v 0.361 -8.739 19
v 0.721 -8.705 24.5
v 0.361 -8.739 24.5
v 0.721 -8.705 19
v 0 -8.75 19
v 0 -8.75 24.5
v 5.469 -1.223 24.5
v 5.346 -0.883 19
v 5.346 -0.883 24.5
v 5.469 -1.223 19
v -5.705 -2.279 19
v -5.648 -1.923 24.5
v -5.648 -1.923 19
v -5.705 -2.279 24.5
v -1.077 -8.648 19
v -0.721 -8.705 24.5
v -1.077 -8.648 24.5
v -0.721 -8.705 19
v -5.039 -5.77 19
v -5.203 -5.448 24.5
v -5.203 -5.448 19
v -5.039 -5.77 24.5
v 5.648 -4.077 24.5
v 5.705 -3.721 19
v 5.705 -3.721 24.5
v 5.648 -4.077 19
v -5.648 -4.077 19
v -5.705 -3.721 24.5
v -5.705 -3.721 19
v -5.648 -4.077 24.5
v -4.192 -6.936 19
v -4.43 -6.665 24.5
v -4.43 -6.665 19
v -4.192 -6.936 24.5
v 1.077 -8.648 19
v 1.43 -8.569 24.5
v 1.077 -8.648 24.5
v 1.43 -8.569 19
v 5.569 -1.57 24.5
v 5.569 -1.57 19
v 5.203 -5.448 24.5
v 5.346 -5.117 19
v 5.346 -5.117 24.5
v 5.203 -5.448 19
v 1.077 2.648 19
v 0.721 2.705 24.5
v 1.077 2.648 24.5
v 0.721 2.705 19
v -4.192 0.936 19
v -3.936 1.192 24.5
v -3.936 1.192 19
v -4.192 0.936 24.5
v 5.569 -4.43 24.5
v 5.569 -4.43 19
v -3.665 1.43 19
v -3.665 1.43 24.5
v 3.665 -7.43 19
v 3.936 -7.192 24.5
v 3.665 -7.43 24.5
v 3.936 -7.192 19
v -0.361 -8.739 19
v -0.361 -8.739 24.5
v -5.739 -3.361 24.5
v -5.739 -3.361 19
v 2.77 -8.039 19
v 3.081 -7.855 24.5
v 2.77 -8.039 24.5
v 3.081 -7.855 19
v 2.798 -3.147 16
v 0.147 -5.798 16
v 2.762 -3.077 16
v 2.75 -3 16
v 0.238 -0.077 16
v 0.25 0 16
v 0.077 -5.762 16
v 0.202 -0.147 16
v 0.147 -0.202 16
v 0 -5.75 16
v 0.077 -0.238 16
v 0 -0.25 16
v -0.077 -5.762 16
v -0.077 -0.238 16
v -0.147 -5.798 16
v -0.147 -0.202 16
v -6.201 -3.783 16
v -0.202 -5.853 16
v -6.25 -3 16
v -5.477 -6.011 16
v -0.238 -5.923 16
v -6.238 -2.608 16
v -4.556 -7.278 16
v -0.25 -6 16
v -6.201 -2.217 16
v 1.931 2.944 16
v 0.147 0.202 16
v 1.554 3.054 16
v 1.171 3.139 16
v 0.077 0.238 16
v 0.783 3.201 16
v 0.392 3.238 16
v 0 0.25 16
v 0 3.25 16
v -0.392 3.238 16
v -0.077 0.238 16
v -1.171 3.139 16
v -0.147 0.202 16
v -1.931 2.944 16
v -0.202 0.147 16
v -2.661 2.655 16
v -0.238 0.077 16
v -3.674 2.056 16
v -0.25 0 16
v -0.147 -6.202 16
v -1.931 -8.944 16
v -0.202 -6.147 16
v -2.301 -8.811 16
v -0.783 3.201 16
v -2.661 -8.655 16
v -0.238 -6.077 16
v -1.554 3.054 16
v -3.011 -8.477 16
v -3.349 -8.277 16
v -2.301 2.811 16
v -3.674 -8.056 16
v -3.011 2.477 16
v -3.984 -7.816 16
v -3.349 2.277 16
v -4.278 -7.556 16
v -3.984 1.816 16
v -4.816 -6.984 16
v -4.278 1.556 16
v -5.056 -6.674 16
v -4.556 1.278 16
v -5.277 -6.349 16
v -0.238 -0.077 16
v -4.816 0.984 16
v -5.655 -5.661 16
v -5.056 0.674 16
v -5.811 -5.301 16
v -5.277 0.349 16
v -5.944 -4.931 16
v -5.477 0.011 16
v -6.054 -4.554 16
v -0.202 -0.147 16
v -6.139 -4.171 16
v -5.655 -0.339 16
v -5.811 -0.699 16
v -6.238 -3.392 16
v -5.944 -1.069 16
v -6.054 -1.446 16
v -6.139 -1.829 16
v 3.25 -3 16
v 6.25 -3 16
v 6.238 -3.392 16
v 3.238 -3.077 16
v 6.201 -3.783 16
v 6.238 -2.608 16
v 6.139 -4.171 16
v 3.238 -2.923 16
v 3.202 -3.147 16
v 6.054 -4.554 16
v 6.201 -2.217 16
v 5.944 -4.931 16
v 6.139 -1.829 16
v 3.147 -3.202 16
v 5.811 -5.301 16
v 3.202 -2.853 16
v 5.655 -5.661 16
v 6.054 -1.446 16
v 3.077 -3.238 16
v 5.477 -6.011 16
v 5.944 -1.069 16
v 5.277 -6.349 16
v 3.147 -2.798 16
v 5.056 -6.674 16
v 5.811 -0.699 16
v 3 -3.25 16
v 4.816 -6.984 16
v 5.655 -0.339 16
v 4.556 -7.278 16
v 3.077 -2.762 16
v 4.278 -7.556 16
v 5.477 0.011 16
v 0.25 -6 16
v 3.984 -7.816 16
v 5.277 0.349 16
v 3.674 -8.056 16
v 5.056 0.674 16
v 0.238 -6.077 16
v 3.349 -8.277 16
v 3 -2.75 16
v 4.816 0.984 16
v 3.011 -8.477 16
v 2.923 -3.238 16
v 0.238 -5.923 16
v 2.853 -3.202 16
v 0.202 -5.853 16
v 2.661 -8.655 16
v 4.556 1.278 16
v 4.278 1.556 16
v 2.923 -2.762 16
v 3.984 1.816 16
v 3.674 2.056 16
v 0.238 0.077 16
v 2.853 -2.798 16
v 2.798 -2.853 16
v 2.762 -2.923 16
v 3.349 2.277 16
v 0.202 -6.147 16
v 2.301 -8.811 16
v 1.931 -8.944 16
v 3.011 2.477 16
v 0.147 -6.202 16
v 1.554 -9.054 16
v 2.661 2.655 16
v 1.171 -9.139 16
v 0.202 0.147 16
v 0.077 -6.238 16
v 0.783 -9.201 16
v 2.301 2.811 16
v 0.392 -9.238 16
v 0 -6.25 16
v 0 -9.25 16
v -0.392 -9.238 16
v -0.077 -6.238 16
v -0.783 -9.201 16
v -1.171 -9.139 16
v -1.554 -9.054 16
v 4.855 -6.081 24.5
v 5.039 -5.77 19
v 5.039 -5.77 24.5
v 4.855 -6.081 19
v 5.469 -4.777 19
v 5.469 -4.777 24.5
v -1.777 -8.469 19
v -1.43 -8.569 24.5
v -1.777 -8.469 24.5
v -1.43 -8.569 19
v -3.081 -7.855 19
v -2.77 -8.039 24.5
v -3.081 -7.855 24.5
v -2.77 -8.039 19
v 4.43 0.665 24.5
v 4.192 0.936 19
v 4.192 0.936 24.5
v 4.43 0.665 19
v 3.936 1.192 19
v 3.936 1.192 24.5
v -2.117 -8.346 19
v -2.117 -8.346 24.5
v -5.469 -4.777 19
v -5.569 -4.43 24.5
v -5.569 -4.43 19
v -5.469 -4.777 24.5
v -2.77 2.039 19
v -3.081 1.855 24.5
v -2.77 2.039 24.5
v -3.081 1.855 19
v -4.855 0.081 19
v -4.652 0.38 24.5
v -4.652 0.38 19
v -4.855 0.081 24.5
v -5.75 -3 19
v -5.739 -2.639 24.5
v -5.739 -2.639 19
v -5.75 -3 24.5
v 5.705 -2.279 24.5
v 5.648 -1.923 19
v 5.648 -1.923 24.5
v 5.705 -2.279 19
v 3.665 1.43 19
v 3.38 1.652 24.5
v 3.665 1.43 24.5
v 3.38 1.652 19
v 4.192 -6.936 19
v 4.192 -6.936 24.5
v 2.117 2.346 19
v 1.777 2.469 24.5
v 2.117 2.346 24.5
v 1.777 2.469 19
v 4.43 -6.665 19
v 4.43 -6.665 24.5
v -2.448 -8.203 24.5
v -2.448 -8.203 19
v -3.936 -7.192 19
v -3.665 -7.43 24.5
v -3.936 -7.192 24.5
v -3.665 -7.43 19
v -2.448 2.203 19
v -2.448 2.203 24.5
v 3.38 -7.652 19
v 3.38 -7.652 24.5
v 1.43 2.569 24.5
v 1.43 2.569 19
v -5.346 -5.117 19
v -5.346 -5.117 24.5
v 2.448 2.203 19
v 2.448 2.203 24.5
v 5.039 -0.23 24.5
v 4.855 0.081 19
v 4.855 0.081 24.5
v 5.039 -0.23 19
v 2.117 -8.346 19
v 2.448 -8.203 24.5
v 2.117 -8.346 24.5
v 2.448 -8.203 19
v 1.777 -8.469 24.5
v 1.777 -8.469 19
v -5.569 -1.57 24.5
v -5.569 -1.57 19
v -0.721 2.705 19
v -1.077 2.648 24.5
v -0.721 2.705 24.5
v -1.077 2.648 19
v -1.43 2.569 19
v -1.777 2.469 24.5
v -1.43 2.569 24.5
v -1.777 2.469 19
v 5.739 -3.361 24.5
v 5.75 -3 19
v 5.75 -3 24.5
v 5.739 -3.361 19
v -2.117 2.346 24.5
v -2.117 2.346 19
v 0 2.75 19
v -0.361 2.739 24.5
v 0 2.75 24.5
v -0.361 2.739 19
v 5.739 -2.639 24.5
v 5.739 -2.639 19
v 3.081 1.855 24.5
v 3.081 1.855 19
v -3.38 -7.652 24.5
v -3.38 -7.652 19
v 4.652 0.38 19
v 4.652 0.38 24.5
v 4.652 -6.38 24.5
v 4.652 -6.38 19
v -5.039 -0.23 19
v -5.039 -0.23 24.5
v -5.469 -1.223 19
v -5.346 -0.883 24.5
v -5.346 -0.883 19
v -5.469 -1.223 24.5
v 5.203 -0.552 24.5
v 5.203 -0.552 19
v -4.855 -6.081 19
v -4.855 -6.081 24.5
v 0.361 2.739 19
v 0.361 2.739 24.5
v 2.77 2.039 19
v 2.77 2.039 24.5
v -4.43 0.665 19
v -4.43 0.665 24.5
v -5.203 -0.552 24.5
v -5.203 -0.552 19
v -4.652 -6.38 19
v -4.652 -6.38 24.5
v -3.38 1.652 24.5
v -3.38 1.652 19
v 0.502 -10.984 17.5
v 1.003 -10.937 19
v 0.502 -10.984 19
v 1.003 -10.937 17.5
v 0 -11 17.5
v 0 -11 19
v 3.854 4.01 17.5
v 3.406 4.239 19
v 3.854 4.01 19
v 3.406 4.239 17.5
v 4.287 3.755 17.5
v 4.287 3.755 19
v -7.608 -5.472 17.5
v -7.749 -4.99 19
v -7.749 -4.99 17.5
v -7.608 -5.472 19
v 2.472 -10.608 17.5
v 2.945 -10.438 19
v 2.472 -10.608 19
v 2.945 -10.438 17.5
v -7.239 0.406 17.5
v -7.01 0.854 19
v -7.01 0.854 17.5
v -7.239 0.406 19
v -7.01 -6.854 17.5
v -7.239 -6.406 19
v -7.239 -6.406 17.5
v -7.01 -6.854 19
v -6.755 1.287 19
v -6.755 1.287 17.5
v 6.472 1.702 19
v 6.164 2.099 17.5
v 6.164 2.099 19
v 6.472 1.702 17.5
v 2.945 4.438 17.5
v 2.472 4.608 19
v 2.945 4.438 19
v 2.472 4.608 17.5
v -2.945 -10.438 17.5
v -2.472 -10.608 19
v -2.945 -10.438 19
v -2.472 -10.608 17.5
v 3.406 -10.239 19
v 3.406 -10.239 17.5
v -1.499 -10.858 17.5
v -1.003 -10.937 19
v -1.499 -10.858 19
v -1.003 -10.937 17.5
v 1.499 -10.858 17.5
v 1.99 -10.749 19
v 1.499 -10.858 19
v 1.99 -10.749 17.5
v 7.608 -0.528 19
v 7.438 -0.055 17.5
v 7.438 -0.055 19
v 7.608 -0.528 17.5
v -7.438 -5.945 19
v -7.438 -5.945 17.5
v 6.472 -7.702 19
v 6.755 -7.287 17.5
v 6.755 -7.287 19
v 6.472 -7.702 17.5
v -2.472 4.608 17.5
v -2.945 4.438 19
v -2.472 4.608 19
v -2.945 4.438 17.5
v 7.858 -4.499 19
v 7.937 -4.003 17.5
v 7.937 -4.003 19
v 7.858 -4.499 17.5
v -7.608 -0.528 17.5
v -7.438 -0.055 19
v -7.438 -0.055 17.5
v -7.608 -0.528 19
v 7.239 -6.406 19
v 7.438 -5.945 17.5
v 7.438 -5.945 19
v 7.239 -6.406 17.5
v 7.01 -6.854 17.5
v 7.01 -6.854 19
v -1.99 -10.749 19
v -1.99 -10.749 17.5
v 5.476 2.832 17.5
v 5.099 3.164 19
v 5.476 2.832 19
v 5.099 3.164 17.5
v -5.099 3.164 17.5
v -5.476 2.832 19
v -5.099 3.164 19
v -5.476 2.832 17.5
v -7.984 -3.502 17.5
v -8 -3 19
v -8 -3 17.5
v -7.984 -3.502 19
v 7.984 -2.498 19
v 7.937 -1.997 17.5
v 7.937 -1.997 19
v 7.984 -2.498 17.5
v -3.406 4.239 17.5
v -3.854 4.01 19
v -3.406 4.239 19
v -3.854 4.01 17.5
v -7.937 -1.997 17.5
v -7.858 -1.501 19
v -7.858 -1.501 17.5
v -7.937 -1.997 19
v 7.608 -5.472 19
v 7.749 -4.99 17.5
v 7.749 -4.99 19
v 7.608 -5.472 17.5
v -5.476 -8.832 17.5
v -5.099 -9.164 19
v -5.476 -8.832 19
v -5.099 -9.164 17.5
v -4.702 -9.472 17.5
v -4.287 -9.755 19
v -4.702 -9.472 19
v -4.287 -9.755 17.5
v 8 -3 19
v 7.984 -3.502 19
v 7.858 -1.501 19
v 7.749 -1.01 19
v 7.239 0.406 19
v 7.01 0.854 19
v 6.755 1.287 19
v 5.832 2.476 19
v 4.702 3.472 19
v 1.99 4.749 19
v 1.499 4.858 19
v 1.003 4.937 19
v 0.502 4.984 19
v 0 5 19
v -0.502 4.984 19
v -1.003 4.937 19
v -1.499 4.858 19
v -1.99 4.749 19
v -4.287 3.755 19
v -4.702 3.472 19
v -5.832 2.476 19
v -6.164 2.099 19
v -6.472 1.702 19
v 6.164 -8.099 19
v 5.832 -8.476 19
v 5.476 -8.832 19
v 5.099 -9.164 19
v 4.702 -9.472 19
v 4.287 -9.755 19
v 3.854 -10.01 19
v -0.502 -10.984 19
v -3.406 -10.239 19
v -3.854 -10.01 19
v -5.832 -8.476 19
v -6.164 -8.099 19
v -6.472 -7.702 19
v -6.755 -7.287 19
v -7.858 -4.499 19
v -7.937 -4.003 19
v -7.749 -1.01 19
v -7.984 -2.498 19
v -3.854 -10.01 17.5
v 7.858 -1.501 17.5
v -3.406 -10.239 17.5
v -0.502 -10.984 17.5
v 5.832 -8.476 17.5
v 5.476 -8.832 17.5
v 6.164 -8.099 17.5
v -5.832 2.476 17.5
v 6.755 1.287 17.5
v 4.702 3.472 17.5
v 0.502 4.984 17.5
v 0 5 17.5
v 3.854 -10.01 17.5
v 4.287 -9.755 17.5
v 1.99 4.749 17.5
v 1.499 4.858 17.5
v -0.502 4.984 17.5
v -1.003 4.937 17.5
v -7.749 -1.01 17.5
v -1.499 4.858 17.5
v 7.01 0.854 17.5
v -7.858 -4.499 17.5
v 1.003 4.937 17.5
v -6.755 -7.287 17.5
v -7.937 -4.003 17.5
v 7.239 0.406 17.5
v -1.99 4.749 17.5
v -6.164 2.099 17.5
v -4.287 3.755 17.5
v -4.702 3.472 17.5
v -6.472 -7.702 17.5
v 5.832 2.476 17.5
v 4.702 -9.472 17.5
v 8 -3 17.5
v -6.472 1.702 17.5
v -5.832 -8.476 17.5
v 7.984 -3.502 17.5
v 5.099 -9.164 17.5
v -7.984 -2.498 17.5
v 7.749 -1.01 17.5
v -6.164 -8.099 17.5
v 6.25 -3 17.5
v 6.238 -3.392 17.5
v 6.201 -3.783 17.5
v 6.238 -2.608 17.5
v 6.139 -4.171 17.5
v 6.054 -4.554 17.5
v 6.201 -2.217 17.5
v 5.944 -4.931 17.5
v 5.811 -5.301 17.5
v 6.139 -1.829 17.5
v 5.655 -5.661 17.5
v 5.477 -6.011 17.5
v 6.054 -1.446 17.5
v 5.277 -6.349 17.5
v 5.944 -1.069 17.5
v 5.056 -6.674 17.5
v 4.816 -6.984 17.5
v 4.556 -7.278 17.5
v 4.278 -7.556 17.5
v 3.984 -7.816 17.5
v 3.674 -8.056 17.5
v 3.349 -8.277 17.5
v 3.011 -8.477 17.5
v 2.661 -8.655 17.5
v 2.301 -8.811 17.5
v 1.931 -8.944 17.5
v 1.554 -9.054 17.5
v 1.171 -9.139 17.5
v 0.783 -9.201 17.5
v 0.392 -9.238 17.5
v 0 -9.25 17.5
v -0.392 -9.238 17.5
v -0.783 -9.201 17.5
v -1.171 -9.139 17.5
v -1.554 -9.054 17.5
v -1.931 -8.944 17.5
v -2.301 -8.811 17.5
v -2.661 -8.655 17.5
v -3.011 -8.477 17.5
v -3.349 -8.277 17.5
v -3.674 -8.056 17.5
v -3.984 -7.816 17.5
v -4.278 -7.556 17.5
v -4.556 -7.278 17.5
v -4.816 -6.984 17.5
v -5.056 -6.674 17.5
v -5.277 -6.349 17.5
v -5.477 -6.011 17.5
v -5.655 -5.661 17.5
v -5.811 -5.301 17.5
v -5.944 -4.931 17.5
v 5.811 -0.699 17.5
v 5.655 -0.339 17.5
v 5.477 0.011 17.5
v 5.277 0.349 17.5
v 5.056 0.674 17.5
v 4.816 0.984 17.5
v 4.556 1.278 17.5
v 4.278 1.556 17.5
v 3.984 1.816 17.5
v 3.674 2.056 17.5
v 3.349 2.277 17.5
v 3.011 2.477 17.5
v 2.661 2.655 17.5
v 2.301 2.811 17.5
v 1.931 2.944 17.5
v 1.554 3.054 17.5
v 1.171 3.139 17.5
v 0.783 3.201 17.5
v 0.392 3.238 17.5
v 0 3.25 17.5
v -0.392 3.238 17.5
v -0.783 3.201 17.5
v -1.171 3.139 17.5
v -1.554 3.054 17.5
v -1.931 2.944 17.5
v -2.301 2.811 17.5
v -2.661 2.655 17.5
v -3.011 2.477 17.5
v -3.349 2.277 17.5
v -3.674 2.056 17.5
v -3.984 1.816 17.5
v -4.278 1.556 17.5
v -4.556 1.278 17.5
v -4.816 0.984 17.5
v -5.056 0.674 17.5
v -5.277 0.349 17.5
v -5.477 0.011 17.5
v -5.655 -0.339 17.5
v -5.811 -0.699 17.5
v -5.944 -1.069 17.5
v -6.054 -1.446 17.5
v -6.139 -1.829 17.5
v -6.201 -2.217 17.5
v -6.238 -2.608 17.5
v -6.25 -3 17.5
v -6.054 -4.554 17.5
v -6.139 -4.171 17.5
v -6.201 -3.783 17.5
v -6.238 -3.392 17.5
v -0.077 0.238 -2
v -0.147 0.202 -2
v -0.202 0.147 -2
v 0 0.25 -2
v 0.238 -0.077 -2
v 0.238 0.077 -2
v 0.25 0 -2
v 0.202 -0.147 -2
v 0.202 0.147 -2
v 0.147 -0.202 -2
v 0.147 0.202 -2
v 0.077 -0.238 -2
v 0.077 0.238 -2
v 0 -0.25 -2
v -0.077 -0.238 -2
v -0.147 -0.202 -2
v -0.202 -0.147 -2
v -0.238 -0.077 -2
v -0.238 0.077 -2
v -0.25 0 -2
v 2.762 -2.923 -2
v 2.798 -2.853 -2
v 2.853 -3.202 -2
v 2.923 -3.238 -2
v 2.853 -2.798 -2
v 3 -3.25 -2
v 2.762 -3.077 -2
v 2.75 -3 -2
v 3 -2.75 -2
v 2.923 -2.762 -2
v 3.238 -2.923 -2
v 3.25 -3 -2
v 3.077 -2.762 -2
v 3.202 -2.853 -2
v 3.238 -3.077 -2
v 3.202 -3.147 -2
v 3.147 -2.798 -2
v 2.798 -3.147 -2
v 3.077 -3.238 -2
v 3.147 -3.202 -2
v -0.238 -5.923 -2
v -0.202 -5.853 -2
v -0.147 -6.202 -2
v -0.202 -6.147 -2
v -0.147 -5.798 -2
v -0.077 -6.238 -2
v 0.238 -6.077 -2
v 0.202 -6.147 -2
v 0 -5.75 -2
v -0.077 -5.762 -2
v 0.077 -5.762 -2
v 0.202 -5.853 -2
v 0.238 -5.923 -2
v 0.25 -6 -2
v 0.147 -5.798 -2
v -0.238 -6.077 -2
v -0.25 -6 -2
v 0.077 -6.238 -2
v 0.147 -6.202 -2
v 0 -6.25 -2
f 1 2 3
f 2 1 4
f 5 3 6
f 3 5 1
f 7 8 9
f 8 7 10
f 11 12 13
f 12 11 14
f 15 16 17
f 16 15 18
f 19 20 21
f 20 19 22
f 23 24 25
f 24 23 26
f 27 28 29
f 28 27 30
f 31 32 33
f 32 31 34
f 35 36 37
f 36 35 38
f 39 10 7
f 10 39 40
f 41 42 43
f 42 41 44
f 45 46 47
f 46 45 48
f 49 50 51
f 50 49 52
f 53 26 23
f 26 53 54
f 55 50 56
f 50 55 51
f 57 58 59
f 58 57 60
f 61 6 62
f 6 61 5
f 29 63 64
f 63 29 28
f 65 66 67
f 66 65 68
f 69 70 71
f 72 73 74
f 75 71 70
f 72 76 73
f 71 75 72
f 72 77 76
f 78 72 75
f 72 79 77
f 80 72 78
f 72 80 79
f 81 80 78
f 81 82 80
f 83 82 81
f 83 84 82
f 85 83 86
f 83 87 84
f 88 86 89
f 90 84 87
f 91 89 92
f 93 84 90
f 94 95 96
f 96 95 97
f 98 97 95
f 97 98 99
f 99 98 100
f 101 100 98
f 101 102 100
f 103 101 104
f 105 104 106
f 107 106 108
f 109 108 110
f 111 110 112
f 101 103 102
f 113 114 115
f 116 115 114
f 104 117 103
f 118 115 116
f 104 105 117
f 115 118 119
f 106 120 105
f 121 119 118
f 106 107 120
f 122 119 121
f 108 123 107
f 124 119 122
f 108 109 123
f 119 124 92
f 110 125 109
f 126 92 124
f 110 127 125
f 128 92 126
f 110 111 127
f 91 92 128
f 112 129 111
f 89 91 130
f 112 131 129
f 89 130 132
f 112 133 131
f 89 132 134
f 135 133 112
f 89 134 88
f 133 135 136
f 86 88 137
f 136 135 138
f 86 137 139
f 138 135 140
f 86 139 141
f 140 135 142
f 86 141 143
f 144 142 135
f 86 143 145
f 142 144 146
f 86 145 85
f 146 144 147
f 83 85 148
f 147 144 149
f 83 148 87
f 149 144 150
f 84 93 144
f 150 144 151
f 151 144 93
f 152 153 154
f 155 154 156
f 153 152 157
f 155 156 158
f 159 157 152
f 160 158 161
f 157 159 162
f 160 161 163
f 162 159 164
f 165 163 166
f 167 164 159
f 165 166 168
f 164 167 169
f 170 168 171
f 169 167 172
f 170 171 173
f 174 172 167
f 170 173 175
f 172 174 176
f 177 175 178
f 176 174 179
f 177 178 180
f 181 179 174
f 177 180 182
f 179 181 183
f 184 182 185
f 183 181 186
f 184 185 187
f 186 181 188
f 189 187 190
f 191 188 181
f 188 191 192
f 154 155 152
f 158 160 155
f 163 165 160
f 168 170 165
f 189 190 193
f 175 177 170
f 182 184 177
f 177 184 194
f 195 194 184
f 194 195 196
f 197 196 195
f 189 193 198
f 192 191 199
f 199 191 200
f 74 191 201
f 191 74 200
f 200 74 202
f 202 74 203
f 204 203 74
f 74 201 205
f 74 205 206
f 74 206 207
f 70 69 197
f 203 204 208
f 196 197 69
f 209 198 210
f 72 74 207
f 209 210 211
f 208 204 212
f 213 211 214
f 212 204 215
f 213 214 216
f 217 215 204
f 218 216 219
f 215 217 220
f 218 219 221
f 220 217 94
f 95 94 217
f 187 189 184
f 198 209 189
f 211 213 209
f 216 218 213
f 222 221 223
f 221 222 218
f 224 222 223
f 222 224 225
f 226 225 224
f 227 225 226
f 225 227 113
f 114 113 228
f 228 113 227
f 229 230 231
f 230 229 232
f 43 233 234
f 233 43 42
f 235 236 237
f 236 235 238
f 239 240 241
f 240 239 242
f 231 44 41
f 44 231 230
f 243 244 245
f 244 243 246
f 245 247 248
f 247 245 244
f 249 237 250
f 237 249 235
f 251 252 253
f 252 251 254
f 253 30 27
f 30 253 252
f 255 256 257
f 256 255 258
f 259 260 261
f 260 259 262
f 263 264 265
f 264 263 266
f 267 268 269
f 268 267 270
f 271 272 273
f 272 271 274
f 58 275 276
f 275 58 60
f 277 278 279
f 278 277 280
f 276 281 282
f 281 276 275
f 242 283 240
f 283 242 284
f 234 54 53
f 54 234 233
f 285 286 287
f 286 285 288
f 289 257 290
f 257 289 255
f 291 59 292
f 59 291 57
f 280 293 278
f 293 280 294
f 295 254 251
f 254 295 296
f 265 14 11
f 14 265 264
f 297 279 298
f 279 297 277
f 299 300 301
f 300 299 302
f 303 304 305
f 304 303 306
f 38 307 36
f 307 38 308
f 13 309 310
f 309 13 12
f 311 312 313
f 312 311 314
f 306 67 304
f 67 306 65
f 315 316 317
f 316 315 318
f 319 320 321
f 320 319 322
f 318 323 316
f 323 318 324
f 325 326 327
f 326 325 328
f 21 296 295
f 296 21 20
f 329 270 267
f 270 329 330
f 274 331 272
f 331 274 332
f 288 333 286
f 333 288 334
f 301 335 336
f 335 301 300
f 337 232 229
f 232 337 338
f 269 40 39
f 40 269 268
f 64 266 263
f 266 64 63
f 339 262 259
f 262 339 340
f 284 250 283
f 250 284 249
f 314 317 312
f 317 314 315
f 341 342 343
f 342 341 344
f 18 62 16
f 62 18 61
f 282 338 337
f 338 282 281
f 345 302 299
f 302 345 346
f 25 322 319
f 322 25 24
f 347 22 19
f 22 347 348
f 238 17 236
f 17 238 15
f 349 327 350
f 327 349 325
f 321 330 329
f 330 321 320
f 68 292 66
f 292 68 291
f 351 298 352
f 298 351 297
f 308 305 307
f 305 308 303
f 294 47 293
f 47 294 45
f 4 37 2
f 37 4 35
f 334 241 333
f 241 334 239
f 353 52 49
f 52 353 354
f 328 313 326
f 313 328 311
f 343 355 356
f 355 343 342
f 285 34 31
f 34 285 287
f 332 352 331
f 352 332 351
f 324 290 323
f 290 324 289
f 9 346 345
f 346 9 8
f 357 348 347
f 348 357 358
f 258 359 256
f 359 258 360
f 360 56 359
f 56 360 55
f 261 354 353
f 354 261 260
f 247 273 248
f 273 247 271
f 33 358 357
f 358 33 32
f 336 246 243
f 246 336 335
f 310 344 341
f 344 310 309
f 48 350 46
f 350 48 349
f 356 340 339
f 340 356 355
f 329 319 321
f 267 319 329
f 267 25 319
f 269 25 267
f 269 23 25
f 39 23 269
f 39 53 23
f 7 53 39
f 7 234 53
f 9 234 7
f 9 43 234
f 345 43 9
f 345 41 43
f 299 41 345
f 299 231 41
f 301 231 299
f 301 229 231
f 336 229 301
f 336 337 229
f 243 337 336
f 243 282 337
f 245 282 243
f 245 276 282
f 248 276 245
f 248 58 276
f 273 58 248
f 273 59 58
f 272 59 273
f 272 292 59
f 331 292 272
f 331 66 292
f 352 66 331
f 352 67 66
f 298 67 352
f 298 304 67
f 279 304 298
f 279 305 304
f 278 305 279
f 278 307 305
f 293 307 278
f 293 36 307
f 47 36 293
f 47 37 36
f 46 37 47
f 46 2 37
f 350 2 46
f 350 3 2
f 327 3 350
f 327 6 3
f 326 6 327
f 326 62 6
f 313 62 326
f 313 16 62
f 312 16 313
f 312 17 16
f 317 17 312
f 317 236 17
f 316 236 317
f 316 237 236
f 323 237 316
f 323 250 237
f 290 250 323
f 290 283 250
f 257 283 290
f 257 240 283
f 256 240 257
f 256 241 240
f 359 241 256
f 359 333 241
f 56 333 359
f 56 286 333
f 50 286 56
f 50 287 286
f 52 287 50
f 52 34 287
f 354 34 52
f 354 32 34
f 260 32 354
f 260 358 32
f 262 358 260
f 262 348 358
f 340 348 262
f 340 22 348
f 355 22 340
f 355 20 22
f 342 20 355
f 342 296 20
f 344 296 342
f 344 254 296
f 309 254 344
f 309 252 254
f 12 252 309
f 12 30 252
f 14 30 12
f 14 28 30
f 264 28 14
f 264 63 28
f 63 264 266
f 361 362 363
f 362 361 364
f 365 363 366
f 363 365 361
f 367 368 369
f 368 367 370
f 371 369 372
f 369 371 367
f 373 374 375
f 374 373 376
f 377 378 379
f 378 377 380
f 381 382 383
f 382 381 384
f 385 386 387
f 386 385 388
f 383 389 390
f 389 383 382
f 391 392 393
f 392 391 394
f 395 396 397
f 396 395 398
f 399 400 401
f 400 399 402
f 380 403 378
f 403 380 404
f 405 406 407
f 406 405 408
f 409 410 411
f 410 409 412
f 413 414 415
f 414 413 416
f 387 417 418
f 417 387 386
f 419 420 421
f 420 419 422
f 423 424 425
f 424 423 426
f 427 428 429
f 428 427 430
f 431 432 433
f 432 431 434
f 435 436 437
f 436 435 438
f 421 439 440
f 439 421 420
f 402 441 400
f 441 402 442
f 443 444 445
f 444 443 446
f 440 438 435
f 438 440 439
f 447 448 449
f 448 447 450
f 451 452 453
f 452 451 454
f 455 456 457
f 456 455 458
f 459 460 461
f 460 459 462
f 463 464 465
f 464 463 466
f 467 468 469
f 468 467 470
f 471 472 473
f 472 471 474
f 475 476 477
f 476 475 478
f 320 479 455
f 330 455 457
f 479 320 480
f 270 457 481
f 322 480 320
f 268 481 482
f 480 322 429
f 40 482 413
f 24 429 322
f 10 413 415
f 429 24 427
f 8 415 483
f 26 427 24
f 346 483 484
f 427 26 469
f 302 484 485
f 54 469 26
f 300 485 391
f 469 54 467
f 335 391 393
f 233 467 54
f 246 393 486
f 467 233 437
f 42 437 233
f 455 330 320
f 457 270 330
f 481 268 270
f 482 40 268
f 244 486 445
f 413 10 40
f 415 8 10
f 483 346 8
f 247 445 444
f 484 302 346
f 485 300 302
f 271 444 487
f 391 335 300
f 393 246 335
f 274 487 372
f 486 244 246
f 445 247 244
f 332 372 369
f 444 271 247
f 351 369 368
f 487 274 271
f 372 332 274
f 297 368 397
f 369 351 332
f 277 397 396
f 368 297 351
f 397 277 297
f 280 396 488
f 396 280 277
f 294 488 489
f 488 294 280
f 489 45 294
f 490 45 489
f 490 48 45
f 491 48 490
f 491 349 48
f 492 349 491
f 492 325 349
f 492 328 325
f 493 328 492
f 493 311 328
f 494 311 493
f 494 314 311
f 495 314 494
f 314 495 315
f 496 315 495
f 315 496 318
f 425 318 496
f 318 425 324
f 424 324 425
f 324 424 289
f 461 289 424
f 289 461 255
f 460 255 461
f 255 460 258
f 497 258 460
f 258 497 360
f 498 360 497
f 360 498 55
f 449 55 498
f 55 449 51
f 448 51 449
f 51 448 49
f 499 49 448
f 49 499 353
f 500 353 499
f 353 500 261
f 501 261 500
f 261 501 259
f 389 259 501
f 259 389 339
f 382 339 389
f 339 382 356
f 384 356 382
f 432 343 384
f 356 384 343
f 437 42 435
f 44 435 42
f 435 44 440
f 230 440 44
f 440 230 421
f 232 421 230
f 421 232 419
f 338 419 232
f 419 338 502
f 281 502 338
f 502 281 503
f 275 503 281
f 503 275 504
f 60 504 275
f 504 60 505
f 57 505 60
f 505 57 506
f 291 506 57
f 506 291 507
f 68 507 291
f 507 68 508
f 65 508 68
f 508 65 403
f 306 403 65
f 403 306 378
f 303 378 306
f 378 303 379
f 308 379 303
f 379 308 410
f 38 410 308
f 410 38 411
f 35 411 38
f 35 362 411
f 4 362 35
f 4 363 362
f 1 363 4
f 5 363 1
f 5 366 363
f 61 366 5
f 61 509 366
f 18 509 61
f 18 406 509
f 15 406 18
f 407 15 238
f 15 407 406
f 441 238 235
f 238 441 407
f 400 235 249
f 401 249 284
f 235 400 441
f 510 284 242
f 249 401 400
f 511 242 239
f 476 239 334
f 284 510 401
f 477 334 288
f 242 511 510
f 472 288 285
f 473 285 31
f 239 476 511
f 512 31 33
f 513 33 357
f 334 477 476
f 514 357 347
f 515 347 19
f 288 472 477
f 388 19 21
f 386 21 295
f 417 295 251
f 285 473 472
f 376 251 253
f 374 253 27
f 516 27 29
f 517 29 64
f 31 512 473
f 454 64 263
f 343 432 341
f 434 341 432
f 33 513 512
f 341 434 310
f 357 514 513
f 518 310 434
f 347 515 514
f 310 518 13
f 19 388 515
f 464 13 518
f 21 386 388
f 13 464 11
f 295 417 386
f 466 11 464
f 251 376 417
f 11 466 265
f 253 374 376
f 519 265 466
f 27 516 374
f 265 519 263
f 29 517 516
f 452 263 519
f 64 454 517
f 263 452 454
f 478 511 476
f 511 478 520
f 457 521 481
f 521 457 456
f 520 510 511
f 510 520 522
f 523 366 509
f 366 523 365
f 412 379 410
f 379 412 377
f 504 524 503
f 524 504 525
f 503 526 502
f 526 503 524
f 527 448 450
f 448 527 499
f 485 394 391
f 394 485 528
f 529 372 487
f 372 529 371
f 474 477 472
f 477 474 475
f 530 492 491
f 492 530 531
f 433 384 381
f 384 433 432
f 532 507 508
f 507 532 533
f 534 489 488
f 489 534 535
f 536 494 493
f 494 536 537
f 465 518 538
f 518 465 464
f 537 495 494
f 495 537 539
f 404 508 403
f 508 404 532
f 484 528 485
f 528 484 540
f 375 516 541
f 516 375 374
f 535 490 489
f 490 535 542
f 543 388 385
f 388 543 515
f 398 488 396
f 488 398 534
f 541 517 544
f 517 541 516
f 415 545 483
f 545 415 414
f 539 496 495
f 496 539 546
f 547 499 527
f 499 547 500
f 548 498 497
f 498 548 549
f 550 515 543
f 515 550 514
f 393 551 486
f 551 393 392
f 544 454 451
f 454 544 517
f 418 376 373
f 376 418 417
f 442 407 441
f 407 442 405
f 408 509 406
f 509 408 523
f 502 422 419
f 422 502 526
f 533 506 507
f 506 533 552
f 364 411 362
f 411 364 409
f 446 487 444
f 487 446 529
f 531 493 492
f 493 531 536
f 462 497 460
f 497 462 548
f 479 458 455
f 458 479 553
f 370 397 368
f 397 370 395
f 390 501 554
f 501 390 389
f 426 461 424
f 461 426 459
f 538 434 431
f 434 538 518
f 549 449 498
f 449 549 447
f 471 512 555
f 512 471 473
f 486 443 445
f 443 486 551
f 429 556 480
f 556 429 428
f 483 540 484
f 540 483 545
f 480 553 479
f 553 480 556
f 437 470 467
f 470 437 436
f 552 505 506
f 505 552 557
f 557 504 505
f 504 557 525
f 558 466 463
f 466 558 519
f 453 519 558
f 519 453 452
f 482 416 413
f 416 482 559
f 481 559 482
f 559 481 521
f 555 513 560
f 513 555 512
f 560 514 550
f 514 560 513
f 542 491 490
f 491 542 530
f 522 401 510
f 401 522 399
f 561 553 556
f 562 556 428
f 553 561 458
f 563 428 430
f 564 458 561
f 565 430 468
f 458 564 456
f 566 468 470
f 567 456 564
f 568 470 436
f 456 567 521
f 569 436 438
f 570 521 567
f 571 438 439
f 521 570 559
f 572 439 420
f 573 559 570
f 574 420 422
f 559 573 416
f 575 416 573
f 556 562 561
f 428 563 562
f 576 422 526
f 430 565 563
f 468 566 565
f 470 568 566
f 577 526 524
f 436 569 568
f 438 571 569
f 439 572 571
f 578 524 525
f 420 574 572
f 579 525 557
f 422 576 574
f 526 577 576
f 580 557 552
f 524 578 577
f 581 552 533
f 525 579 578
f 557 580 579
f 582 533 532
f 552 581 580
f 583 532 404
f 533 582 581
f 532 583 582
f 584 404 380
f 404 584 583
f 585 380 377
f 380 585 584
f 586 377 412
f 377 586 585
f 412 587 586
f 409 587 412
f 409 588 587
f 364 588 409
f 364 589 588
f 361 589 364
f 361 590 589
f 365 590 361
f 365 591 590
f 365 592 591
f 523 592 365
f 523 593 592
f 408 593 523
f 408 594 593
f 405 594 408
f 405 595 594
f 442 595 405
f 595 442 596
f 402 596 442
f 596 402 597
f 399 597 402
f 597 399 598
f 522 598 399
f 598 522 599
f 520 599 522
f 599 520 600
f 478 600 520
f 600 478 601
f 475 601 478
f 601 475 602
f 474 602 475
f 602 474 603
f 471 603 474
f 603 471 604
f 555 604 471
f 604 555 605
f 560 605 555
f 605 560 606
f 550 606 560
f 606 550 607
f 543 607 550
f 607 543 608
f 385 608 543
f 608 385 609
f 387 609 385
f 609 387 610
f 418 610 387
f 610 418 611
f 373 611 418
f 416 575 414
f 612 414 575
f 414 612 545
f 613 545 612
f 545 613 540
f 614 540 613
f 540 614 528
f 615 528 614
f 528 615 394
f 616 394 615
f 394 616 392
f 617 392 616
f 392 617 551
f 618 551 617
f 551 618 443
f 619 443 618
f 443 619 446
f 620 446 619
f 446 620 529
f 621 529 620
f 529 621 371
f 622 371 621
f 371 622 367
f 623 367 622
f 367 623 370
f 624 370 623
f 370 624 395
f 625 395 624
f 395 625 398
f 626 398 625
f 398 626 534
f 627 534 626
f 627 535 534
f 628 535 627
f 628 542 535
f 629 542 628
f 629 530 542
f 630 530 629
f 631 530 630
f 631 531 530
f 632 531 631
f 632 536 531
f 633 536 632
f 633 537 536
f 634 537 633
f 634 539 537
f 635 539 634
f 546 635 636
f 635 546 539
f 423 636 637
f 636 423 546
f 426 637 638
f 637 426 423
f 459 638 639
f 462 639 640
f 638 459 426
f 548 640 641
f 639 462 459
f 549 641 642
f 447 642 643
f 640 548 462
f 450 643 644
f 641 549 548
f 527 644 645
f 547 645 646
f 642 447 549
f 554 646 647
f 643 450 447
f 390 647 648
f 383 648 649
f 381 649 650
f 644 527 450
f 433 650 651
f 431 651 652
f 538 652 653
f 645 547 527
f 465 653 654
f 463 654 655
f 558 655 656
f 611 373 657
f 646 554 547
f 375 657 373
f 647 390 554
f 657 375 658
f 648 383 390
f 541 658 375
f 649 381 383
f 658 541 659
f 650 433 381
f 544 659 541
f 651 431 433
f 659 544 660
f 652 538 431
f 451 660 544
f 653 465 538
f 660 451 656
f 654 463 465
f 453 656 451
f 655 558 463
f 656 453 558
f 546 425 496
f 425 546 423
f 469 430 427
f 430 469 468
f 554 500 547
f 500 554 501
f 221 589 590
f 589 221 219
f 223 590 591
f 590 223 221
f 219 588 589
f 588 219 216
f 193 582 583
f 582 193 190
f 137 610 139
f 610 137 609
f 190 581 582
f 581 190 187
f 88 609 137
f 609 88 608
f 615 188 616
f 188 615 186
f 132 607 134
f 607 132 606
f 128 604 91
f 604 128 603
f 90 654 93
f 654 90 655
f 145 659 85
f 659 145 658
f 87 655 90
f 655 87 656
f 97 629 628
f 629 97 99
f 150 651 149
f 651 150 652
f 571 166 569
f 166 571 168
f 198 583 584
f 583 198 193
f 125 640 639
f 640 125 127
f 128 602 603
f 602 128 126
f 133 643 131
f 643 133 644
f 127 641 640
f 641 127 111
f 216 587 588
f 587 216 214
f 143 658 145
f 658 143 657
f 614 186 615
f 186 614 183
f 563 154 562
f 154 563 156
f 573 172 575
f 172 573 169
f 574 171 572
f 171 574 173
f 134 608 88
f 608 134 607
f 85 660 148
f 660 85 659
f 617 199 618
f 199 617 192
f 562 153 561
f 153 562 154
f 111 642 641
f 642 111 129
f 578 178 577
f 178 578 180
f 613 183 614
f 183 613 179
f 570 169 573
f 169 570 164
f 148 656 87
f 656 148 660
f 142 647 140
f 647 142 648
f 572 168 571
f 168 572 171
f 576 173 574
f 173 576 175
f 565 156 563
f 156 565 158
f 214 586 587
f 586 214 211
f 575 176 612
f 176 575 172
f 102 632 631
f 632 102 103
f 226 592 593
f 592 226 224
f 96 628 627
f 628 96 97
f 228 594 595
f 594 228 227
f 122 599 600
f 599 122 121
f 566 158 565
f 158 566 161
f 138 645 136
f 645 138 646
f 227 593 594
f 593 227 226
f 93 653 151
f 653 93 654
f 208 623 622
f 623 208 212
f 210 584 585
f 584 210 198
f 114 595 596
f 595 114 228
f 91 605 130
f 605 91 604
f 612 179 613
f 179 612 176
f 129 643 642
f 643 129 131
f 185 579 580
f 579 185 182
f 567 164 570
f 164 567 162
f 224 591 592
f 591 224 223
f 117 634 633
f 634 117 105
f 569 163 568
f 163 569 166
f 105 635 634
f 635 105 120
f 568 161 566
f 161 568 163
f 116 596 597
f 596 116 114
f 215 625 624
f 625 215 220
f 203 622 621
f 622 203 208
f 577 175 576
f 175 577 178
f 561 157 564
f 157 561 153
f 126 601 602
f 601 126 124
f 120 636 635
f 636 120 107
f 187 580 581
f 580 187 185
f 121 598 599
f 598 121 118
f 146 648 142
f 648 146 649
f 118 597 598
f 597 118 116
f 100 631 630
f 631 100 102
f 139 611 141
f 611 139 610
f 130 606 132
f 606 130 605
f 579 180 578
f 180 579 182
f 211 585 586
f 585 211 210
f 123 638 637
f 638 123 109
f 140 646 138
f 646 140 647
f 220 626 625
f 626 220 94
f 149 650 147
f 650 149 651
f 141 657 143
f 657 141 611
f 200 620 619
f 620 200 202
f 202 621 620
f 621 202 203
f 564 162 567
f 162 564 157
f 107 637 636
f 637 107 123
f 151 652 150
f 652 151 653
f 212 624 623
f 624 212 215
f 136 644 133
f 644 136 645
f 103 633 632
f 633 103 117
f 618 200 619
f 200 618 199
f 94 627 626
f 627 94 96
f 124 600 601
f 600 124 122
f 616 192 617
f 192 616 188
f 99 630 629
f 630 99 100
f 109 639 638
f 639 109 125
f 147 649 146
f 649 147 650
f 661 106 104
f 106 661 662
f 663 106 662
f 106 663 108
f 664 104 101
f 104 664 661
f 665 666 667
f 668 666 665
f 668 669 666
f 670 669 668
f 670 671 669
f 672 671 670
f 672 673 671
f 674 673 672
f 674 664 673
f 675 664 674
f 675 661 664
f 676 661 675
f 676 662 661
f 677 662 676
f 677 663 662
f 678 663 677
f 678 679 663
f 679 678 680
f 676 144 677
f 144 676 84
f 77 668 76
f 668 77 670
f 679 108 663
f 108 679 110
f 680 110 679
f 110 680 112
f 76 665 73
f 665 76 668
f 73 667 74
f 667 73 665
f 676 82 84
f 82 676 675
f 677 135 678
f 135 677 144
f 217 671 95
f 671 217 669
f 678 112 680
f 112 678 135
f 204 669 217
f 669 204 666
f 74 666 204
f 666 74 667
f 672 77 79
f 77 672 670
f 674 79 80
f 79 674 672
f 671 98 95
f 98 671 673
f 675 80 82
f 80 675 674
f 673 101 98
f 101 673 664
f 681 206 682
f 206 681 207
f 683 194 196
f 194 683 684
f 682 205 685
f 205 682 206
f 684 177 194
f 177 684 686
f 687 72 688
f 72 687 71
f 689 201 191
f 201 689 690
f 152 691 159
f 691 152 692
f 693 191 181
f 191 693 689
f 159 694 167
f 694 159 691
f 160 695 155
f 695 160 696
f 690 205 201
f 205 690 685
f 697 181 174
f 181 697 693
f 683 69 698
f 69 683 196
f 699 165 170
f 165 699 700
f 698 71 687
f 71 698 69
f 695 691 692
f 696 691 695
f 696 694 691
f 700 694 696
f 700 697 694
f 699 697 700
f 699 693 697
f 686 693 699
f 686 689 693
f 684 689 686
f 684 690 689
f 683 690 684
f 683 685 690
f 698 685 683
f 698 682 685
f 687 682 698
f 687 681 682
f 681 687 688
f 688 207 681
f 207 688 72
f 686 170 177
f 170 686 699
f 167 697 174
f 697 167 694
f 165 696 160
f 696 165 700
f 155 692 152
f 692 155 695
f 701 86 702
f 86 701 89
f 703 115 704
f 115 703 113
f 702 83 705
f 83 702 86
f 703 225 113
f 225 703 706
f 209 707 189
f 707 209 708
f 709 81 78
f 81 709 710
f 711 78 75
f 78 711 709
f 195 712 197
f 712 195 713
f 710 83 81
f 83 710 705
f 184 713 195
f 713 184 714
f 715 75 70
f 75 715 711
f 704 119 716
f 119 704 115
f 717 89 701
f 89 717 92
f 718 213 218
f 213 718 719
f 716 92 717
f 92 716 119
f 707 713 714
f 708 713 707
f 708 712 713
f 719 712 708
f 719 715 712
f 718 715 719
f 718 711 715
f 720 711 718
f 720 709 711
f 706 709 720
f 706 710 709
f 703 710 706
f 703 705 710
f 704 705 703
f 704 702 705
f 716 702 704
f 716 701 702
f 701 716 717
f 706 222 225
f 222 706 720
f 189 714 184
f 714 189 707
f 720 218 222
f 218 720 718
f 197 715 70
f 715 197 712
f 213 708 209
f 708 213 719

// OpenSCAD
/**
 * Корпус
 */
module body() {
    cylinder(h=8.5, r=11.5/2, $fn=100);
    translate([0, 0, 1.5]) cylinder(h=1.5, r=8, $fn=100);
    cylinder(h=1.5, r=12.5/2, $fn=100);
}

/**
 * Вывод
 */
module lead() {
    cylinder(h=32/2+5, r=0.5/2, $fn=20);
}

rotate([0,0,270]) {
    translate([3, 0, 32/2]) body();
    rotate([0,0,180]) translate([0, 0, -2]) lead();
    rotate([0,0,180]) translate([-3, -3, -2]) lead();
    rotate([0,0,180]) translate([-6, 0, -2]) lead();
}
